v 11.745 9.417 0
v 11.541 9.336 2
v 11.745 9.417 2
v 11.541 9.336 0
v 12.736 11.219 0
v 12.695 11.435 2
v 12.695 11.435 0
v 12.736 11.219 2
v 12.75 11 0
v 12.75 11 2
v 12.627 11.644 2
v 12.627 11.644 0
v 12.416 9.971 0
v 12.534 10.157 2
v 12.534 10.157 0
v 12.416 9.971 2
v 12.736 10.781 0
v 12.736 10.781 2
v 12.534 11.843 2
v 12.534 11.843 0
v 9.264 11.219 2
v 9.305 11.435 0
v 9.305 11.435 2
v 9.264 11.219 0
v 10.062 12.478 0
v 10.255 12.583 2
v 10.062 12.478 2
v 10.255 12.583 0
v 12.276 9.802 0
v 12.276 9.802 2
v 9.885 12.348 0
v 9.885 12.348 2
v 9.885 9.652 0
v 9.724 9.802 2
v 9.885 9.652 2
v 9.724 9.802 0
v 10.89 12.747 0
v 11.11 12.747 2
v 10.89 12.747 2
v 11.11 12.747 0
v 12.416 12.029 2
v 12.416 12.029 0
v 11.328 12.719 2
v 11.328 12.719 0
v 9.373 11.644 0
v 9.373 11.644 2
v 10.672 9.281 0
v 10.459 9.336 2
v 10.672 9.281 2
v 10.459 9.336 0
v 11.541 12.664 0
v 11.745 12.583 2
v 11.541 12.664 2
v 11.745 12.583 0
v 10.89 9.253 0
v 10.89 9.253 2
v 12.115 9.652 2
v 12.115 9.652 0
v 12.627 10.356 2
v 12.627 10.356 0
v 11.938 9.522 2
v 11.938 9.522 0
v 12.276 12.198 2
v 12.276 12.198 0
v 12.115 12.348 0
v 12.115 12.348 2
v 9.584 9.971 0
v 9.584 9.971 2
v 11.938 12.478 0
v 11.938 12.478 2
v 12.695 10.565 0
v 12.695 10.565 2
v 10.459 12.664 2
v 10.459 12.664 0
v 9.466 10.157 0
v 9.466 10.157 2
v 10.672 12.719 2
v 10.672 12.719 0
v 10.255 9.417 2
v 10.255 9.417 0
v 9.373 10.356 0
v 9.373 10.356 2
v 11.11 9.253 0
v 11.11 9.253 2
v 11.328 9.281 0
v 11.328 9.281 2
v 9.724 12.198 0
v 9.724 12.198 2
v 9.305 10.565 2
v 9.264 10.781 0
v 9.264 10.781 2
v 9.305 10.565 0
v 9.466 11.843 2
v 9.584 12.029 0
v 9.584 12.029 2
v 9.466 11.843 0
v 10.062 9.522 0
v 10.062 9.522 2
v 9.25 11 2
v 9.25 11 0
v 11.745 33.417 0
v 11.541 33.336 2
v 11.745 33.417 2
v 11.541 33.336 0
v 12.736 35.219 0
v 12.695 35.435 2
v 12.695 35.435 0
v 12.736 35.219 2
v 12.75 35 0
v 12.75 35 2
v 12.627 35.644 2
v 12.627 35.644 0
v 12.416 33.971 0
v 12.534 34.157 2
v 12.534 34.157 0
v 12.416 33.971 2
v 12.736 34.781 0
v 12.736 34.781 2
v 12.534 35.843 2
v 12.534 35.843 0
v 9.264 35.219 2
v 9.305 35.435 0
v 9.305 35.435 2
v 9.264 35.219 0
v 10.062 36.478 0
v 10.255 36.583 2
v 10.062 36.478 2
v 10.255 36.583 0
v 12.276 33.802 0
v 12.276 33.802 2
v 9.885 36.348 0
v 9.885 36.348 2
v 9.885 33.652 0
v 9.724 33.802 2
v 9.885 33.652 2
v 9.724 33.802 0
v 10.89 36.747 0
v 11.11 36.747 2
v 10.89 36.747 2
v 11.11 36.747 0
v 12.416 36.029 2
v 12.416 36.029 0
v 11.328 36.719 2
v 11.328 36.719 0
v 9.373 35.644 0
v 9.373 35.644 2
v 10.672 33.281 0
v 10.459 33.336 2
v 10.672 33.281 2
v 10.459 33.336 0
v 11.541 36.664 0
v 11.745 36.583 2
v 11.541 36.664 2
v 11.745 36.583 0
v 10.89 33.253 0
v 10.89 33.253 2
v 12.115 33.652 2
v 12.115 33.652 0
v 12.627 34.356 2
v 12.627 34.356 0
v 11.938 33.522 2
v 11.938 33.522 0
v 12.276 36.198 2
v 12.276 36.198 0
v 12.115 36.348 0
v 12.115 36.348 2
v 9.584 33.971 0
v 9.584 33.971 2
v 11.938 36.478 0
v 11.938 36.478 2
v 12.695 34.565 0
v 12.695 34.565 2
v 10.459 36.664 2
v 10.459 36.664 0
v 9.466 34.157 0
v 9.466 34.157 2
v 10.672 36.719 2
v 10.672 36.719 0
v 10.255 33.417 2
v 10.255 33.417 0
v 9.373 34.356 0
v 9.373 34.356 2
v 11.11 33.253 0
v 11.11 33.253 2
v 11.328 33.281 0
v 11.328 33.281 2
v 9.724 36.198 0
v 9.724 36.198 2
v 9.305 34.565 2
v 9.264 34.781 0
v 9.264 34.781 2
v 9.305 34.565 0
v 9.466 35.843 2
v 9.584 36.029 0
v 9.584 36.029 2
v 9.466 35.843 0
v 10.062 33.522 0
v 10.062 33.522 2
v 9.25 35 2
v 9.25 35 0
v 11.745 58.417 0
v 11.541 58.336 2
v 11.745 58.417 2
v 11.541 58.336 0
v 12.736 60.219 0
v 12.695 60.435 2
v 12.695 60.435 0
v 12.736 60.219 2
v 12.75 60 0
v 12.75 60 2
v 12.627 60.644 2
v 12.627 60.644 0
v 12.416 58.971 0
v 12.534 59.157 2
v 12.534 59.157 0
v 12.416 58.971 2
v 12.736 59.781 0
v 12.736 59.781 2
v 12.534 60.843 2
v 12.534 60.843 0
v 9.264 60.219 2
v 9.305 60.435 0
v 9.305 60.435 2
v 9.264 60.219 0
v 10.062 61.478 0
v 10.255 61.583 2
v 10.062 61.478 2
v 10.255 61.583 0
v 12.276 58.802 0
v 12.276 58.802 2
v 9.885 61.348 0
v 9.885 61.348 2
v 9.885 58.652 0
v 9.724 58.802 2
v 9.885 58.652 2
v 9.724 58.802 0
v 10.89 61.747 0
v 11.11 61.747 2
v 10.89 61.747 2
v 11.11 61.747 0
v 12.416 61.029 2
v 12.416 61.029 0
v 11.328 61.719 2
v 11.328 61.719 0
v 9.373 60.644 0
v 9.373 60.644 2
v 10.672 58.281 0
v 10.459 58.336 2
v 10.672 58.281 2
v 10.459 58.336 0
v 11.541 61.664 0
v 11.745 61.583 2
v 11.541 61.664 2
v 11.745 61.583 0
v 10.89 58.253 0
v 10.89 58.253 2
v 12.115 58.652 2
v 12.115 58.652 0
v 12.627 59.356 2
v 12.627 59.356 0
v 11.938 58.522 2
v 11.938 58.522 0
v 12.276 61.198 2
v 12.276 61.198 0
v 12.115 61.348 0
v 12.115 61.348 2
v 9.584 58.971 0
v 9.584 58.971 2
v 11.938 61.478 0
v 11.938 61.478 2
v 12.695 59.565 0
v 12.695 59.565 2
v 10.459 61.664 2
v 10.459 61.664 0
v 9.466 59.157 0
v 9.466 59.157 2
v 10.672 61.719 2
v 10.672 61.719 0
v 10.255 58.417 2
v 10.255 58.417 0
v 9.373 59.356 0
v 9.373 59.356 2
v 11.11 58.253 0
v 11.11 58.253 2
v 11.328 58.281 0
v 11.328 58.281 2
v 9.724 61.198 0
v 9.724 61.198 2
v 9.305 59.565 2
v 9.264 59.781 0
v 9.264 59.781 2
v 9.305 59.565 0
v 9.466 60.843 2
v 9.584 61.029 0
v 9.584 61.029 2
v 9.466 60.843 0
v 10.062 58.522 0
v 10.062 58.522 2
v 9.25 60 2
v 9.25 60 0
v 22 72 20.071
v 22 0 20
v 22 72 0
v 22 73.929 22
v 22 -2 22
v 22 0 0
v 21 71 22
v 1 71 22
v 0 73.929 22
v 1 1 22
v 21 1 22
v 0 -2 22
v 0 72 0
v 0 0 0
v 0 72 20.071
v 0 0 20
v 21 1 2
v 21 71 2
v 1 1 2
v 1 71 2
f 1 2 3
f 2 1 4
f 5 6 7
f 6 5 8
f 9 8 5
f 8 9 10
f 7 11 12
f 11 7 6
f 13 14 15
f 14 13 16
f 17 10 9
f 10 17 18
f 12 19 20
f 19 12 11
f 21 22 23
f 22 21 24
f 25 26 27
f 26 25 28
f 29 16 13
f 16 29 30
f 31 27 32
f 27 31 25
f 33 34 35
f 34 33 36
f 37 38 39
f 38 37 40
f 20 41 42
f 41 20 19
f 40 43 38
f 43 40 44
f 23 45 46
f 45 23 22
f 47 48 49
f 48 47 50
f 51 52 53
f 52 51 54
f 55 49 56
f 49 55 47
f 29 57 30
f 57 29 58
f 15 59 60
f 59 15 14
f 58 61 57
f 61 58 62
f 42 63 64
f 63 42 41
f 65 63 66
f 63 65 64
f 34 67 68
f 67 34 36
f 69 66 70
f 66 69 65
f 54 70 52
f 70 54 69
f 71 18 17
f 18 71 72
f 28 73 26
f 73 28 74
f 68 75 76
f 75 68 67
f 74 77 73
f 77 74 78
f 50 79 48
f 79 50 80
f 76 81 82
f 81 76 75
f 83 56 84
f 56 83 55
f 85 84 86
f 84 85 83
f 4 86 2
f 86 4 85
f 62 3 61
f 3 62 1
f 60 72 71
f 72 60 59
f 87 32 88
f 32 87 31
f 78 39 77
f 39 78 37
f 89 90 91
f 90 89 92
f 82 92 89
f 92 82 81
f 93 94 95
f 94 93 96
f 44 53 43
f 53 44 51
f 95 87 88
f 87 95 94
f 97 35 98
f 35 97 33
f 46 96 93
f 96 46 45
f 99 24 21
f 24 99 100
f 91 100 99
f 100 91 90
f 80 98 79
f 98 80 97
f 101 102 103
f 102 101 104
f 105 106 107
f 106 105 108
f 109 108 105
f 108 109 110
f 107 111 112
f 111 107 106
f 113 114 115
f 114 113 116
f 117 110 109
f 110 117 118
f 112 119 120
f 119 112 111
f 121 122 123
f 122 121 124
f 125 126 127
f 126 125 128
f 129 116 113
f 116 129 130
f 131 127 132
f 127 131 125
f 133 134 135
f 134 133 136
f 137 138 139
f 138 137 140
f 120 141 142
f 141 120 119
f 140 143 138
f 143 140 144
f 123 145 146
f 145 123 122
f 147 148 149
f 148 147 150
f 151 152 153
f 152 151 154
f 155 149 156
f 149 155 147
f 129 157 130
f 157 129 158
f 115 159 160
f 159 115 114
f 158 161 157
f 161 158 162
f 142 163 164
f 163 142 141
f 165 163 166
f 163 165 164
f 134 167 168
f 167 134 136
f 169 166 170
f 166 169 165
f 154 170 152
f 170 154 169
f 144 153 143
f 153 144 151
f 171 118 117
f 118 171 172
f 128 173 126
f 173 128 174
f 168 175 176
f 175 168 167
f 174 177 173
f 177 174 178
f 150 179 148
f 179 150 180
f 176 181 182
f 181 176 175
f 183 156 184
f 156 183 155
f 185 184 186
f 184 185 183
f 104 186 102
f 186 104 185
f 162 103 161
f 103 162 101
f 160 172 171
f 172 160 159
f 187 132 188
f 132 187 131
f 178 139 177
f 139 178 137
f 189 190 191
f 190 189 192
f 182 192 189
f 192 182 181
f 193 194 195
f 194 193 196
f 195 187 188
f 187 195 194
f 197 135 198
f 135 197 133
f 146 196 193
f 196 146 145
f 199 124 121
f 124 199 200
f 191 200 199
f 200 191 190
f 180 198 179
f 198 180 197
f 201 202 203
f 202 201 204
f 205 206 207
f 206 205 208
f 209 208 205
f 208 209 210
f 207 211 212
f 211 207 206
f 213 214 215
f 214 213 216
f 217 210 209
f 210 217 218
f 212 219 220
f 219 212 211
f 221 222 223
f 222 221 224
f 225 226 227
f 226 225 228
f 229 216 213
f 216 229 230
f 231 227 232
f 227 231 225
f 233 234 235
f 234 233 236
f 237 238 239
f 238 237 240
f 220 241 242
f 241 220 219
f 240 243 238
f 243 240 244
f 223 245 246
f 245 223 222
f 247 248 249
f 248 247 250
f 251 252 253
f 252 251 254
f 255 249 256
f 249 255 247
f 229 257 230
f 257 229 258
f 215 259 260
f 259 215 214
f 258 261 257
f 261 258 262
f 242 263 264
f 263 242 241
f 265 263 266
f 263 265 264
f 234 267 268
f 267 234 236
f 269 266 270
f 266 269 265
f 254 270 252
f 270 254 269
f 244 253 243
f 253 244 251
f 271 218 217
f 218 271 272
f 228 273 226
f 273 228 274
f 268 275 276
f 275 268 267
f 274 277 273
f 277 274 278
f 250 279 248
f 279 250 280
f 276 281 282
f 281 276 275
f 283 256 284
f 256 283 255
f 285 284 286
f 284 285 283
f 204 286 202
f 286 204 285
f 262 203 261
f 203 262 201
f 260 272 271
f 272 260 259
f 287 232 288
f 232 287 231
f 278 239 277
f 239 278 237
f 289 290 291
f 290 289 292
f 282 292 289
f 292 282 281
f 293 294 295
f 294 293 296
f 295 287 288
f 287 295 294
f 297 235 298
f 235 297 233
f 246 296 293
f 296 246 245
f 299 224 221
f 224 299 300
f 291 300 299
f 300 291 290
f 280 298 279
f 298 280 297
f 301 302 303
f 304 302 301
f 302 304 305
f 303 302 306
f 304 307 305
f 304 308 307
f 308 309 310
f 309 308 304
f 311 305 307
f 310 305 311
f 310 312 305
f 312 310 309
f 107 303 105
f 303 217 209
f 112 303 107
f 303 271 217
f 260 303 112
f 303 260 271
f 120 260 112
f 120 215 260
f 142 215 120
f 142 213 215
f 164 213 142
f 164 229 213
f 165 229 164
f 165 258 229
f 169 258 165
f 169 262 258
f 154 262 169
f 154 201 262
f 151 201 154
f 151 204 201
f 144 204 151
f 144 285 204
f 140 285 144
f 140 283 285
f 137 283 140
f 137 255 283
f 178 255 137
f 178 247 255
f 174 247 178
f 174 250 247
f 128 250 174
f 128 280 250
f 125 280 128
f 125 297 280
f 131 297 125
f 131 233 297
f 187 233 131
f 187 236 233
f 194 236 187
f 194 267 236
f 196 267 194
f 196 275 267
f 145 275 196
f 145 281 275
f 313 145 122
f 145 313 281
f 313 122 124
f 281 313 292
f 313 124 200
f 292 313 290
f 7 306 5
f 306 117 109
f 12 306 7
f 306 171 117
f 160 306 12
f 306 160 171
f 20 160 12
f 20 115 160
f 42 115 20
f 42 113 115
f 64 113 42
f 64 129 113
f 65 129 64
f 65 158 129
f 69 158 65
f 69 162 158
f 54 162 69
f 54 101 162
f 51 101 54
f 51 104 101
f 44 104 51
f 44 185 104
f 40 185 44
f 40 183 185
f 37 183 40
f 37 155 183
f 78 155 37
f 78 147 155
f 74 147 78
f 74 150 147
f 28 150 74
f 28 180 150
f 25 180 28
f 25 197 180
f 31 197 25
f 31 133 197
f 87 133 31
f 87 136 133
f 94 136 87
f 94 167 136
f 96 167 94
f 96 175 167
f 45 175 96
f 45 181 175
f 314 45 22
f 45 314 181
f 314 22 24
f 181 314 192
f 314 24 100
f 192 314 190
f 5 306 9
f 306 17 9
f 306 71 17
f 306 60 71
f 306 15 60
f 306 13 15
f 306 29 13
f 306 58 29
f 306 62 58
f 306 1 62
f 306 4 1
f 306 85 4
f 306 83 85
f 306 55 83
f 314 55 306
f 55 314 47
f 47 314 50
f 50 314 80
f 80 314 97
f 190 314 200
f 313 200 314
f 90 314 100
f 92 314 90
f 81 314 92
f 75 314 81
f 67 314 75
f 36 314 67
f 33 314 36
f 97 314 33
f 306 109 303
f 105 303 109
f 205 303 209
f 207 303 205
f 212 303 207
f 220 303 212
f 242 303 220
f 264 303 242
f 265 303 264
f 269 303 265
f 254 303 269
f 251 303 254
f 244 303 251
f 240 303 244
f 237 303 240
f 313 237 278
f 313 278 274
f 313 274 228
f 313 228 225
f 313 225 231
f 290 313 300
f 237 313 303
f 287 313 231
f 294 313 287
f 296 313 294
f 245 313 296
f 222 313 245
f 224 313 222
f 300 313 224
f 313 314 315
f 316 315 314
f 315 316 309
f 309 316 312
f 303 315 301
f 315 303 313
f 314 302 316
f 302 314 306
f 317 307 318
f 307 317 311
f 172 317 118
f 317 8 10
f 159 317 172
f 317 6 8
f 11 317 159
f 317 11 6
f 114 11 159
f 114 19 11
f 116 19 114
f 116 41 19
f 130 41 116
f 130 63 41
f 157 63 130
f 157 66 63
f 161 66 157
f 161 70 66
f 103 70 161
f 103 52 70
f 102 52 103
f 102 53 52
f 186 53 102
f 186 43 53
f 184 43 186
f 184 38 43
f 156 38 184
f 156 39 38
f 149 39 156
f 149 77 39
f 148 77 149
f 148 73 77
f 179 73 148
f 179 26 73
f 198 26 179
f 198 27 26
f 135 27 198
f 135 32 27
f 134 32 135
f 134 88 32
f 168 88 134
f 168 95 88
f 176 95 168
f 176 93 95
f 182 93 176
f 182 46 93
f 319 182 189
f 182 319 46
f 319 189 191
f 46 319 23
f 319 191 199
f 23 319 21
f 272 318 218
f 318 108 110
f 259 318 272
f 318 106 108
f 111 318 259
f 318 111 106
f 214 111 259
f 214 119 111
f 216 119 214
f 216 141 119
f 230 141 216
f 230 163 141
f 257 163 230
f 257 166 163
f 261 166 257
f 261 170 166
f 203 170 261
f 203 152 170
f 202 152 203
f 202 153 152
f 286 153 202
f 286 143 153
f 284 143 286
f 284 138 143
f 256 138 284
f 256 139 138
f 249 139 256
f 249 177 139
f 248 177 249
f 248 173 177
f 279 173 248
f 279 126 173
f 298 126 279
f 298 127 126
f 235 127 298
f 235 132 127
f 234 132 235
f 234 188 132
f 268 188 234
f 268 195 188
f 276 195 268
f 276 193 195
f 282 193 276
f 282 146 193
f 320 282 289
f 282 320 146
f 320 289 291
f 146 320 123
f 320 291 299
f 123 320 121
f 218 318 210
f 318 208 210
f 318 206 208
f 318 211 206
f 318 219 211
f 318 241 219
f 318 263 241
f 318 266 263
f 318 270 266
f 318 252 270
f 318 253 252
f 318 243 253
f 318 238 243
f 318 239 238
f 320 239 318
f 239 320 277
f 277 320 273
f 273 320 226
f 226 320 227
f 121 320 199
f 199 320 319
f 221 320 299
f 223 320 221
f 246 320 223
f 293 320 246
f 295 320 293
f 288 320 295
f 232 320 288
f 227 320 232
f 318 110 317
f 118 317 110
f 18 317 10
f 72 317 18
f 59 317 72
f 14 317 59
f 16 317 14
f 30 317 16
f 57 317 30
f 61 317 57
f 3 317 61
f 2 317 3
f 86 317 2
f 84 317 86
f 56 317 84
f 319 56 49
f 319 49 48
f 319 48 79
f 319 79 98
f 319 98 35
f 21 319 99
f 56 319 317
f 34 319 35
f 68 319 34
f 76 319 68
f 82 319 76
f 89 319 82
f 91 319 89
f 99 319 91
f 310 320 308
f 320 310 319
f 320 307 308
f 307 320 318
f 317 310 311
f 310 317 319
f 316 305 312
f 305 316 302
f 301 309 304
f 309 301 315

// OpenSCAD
// (C) 2016 B. Visee, info@lichtsignaal.nl
// This is for making lightboxes in, mostly, h0-scale, houses
// No guarentees, but I like it!

// You can make it all sorts of sizes with an adjustable
// number of holes for your LED's (also adjustable!)
// Printed at 0.25mm or 0.3mm height. 0.4 is too big
// The parameters are INSIDE sizes!

// ===================================
// ** CHANGELOG
// ===================================
// v1 Added better spacing for holes
//    Added holestart parameter so you can align hole(s) from the sides

// ===================================
// ** START USER PARAMETERS
// ===================================

width = 70;
depth = 20;
height = 20;
diameter = 3.5;     // On my da Vinci this is the size for 3mm LED
numholes = 3;       // Number of holes you want, if set auto = 0
holestart = 10;      // Start/end position of hole

// To-Do ...
//autohole = 0;       // Auto-magic number of holes (WIP)
//autospacing = 10;   // Auto-magic spacing of holes (WIP)
// Add wall options 

// ===================================
// ** END USER PARAMETERS
// ===================================

holewidth =  ( ( width - ( holestart * 2 ) ) / (numholes - 1) );

union()
{
    difference()
    {
        cube([height+2,width+2,depth+2]);

        translate([1, 1, 2])
        {
        cube([height,width,depth+2]);
        }
        
        if(numholes == 1)
        {
            translate([(height/2)+1,(width/2)+1,-3])
            {
                cylinder(10,d=diameter,diameter/2,$fn=50);
            }
        }
        else
        {
            for (n = [ 1 : numholes ] )
            {
                
                if( n == 1 )
                {
                    translate([(height/2)+1,holestart+1,-3])
                    {
                        cylinder(10,d=diameter,diameter/2,$fn=50);
                    }
                }
               
                if ( n == numholes )
                {
                    translate([(height/2)+1,width - (holestart),-3])
                    {
                        cylinder(10,d=diameter,diameter/2,$fn=50);
                    }
                }
                
                if( ( n != 1) && ( n != numholes) )
                 {
                    translate([(height/2)+1,((n-1)*holewidth) + holestart,-3])
                    {
                        cylinder(10,d=diameter,diameter/2,$fn=50);
                    }
                }   
            }
        }
    }

    difference()
    {
        translate([0,-2,depth])
        {    
            cube([height+2,2,2]);
        }

        translate([-1,1,depth-1])
        {
            rotate([135,0,0])
            {
                cube([height+4,5,5]);
            }
        }
    }

    difference()
    {
        translate([0,width+2,depth])
        {    
            cube([height+2,2,2]);
        }

        translate([-1,width+8,depth-1])
        {
            rotate([135,0,0])
            {
                cube([height+4,5,5]);
            }
        }
    }
}
